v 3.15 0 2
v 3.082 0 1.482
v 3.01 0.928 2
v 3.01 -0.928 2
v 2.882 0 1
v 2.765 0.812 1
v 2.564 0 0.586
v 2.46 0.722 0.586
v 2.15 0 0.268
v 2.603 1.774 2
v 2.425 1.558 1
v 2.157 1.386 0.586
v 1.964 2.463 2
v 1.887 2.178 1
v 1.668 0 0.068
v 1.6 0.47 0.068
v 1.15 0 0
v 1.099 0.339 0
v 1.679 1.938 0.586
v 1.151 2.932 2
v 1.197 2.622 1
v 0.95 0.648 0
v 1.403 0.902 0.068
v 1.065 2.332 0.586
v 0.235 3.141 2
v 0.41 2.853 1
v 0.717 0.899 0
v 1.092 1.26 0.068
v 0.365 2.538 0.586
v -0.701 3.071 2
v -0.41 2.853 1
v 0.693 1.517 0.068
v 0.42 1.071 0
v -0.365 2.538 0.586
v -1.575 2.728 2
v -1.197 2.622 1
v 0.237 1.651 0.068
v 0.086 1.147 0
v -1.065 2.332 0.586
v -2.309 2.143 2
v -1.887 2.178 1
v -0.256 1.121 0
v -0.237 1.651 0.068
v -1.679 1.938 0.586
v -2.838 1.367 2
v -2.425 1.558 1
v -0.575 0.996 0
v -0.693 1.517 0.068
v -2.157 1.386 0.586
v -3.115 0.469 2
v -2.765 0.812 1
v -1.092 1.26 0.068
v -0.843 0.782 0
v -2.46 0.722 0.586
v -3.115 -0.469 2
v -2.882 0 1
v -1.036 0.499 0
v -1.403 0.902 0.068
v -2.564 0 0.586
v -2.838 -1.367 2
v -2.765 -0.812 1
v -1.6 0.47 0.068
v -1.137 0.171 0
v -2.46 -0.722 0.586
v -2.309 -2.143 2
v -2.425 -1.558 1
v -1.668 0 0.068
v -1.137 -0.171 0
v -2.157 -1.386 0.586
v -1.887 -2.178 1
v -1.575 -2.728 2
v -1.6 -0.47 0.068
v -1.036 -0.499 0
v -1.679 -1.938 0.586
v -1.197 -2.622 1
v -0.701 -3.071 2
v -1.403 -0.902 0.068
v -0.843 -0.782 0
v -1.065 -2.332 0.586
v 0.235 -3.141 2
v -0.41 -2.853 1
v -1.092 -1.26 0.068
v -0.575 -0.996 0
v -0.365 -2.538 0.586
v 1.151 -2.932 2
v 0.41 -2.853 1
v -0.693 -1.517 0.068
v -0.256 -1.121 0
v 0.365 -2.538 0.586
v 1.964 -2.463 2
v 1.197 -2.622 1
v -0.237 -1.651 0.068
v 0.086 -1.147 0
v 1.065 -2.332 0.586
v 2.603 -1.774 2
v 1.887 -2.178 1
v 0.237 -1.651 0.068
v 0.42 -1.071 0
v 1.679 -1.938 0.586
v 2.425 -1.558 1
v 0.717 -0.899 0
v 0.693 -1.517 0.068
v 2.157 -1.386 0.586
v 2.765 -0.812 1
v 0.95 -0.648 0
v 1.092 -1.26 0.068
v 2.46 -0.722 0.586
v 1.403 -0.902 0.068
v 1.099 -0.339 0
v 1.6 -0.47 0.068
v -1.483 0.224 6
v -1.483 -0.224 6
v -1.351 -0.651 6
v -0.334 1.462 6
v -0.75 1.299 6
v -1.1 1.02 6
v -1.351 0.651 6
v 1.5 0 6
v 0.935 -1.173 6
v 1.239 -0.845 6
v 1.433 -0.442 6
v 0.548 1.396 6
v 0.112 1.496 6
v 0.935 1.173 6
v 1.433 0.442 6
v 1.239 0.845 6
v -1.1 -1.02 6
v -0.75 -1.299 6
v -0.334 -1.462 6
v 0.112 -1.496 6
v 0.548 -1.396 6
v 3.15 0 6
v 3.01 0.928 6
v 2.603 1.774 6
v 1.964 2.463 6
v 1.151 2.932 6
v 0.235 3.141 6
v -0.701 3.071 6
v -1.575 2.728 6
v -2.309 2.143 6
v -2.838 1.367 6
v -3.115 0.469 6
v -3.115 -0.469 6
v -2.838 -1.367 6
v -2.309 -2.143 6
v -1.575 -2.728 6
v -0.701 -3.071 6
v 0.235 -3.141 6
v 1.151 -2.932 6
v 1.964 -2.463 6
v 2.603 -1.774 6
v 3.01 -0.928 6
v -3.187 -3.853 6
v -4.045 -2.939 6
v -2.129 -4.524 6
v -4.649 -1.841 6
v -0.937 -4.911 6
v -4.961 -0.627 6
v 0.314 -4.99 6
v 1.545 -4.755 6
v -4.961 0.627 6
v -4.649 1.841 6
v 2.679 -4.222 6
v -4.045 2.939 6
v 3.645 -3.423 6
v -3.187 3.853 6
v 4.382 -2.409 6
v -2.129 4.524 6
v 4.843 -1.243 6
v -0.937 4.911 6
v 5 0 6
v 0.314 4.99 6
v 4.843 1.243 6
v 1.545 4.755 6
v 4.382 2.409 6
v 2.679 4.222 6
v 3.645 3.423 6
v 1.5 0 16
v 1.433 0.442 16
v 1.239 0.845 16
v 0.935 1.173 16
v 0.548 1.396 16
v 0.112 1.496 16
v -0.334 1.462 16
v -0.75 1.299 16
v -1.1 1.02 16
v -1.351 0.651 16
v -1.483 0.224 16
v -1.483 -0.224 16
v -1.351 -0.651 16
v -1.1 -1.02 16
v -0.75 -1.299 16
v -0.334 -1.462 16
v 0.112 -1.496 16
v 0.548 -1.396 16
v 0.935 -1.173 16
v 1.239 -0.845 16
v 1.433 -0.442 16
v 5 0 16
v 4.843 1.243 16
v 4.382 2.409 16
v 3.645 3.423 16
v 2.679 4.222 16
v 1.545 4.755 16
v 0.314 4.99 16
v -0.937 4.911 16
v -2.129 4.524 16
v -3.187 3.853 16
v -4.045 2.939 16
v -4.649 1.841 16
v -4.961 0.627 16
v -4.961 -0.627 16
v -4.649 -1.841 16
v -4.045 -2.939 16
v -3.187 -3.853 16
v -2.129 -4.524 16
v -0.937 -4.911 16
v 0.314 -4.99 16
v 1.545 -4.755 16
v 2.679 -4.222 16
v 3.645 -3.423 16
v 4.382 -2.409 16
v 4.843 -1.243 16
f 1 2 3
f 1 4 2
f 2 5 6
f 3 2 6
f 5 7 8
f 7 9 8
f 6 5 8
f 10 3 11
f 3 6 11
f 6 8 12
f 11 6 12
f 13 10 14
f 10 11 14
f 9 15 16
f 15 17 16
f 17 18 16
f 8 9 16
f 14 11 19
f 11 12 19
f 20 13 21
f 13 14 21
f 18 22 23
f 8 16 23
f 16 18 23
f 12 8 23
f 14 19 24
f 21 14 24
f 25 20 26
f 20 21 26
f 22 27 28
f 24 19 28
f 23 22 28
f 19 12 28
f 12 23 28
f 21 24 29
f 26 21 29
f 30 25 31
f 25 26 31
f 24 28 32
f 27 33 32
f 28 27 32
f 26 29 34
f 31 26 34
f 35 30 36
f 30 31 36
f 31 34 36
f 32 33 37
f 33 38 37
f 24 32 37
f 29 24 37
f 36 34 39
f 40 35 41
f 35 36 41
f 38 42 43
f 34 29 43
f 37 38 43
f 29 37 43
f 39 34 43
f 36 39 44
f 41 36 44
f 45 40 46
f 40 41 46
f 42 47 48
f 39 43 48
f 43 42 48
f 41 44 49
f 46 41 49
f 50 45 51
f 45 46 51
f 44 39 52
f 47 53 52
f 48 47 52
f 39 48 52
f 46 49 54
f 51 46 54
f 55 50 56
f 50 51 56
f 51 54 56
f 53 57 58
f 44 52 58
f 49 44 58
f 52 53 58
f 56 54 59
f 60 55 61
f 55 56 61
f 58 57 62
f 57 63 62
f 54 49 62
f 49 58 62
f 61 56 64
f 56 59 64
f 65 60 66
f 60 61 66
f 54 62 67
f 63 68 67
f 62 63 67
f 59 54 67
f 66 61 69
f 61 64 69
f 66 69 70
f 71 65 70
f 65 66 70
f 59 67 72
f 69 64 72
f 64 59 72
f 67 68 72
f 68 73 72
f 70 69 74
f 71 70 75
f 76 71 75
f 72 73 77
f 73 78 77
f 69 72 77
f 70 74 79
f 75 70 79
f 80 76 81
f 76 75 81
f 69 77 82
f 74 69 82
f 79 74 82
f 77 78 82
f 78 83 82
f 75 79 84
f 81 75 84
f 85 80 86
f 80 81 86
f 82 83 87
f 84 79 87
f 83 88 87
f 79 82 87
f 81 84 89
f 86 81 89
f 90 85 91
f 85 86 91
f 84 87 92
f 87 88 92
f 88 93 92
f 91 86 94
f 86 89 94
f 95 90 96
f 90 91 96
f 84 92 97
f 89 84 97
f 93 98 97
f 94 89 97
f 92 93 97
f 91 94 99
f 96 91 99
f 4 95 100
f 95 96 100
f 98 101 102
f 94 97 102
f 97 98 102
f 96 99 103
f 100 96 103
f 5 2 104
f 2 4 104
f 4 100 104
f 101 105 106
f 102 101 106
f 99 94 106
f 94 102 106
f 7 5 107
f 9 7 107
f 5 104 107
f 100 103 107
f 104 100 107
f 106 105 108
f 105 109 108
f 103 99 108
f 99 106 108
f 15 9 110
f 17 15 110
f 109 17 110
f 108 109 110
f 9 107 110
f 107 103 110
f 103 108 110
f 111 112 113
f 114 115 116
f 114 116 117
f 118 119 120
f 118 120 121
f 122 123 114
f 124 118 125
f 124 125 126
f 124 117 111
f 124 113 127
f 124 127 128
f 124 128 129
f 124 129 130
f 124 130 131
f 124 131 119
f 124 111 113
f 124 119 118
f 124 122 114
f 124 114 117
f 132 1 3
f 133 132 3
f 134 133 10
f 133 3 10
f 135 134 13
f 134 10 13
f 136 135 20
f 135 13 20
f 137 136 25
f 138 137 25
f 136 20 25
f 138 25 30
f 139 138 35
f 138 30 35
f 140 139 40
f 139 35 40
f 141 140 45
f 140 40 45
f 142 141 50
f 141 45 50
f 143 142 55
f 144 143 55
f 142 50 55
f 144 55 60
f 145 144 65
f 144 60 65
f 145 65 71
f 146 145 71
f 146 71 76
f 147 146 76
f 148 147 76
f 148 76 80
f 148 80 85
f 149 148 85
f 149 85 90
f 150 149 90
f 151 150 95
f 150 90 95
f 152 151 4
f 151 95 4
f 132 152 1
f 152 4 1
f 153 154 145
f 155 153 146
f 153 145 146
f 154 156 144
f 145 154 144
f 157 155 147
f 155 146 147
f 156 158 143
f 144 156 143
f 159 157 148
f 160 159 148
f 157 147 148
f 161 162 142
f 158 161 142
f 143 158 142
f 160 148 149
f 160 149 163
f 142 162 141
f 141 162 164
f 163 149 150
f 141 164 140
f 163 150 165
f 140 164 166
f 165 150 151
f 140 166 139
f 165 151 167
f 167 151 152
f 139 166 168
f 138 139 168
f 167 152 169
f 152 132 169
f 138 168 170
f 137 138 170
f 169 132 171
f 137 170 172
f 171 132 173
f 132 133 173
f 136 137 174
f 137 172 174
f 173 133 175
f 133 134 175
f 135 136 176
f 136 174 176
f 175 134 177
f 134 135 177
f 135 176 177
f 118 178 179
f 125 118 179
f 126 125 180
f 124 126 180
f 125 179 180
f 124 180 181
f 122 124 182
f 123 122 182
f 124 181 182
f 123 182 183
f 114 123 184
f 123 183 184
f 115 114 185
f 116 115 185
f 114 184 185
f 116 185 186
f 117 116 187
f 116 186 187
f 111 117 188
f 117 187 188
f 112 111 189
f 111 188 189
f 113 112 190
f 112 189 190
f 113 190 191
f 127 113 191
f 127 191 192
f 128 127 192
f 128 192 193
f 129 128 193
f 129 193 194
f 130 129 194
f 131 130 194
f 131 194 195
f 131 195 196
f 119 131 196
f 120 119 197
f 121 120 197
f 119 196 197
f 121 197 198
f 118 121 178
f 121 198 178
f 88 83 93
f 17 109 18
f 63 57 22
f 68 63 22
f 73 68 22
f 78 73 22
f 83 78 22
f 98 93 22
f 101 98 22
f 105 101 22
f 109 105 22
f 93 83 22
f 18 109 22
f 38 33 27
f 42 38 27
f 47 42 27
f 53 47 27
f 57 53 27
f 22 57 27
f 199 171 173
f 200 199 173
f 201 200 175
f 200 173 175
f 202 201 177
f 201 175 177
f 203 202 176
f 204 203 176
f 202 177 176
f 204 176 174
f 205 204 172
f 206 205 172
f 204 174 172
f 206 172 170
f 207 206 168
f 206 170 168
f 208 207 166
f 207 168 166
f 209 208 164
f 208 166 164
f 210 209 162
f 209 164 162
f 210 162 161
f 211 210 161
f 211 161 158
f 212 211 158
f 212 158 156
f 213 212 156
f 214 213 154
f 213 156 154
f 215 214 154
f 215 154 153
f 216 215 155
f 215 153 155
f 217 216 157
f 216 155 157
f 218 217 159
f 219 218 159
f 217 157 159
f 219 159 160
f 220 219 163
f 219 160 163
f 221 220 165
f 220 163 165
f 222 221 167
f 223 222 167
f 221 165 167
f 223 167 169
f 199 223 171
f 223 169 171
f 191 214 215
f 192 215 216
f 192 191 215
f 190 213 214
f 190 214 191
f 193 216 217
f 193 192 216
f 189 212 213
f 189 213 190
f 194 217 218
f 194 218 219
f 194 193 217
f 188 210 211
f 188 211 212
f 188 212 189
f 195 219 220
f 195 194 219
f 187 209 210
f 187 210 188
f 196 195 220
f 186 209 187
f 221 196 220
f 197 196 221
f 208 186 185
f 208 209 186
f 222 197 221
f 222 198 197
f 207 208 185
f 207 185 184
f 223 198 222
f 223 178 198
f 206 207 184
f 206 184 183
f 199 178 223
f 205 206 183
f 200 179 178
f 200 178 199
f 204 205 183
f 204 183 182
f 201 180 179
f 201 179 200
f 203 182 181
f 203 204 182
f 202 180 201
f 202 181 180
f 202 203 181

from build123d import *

# Parameters (mm, degrees)
ESQUISSE1_R             = 3.15
BOSS_EXTRU_1_DEPTH      = 6
ESQUISSE3_R             = 5
BOSS_EXTRU_2_DEPTH      = 10
ESQUISSE4_R             = 1.5
ENL_V_MAT_EXTRU_1_DEPTH = 10
CONG_1_R                = 2


with BuildPart() as part:
    # Esquisse1 → Boss.-Extru.1 (new body)
    with BuildSketch(Plane.XY):
        Circle(ESQUISSE1_R)
    extrude(amount=BOSS_EXTRU_1_DEPTH)

    # Esquisse3 → Boss.-Extru.2 (add)
    with BuildSketch(Plane.XY.offset(6)):
        Circle(ESQUISSE3_R)
    extrude(amount=BOSS_EXTRU_2_DEPTH)

    # Esquisse4 → Enlèv. mat.-Extru.1 (cut)
    with BuildSketch(Plane.XY.offset(16)):
        Circle(ESQUISSE4_R)
    extrude(amount=-ENL_V_MAT_EXTRU_1_DEPTH, mode=Mode.SUBTRACT)

    # Congé1
    cong_1_edges = [part.edges().sort_by_distance(p)[0] for p in [
        (-3.15, 0, 0),
    ]]
    fillet(cong_1_edges, radius=CONG_1_R)


solid = part.part
